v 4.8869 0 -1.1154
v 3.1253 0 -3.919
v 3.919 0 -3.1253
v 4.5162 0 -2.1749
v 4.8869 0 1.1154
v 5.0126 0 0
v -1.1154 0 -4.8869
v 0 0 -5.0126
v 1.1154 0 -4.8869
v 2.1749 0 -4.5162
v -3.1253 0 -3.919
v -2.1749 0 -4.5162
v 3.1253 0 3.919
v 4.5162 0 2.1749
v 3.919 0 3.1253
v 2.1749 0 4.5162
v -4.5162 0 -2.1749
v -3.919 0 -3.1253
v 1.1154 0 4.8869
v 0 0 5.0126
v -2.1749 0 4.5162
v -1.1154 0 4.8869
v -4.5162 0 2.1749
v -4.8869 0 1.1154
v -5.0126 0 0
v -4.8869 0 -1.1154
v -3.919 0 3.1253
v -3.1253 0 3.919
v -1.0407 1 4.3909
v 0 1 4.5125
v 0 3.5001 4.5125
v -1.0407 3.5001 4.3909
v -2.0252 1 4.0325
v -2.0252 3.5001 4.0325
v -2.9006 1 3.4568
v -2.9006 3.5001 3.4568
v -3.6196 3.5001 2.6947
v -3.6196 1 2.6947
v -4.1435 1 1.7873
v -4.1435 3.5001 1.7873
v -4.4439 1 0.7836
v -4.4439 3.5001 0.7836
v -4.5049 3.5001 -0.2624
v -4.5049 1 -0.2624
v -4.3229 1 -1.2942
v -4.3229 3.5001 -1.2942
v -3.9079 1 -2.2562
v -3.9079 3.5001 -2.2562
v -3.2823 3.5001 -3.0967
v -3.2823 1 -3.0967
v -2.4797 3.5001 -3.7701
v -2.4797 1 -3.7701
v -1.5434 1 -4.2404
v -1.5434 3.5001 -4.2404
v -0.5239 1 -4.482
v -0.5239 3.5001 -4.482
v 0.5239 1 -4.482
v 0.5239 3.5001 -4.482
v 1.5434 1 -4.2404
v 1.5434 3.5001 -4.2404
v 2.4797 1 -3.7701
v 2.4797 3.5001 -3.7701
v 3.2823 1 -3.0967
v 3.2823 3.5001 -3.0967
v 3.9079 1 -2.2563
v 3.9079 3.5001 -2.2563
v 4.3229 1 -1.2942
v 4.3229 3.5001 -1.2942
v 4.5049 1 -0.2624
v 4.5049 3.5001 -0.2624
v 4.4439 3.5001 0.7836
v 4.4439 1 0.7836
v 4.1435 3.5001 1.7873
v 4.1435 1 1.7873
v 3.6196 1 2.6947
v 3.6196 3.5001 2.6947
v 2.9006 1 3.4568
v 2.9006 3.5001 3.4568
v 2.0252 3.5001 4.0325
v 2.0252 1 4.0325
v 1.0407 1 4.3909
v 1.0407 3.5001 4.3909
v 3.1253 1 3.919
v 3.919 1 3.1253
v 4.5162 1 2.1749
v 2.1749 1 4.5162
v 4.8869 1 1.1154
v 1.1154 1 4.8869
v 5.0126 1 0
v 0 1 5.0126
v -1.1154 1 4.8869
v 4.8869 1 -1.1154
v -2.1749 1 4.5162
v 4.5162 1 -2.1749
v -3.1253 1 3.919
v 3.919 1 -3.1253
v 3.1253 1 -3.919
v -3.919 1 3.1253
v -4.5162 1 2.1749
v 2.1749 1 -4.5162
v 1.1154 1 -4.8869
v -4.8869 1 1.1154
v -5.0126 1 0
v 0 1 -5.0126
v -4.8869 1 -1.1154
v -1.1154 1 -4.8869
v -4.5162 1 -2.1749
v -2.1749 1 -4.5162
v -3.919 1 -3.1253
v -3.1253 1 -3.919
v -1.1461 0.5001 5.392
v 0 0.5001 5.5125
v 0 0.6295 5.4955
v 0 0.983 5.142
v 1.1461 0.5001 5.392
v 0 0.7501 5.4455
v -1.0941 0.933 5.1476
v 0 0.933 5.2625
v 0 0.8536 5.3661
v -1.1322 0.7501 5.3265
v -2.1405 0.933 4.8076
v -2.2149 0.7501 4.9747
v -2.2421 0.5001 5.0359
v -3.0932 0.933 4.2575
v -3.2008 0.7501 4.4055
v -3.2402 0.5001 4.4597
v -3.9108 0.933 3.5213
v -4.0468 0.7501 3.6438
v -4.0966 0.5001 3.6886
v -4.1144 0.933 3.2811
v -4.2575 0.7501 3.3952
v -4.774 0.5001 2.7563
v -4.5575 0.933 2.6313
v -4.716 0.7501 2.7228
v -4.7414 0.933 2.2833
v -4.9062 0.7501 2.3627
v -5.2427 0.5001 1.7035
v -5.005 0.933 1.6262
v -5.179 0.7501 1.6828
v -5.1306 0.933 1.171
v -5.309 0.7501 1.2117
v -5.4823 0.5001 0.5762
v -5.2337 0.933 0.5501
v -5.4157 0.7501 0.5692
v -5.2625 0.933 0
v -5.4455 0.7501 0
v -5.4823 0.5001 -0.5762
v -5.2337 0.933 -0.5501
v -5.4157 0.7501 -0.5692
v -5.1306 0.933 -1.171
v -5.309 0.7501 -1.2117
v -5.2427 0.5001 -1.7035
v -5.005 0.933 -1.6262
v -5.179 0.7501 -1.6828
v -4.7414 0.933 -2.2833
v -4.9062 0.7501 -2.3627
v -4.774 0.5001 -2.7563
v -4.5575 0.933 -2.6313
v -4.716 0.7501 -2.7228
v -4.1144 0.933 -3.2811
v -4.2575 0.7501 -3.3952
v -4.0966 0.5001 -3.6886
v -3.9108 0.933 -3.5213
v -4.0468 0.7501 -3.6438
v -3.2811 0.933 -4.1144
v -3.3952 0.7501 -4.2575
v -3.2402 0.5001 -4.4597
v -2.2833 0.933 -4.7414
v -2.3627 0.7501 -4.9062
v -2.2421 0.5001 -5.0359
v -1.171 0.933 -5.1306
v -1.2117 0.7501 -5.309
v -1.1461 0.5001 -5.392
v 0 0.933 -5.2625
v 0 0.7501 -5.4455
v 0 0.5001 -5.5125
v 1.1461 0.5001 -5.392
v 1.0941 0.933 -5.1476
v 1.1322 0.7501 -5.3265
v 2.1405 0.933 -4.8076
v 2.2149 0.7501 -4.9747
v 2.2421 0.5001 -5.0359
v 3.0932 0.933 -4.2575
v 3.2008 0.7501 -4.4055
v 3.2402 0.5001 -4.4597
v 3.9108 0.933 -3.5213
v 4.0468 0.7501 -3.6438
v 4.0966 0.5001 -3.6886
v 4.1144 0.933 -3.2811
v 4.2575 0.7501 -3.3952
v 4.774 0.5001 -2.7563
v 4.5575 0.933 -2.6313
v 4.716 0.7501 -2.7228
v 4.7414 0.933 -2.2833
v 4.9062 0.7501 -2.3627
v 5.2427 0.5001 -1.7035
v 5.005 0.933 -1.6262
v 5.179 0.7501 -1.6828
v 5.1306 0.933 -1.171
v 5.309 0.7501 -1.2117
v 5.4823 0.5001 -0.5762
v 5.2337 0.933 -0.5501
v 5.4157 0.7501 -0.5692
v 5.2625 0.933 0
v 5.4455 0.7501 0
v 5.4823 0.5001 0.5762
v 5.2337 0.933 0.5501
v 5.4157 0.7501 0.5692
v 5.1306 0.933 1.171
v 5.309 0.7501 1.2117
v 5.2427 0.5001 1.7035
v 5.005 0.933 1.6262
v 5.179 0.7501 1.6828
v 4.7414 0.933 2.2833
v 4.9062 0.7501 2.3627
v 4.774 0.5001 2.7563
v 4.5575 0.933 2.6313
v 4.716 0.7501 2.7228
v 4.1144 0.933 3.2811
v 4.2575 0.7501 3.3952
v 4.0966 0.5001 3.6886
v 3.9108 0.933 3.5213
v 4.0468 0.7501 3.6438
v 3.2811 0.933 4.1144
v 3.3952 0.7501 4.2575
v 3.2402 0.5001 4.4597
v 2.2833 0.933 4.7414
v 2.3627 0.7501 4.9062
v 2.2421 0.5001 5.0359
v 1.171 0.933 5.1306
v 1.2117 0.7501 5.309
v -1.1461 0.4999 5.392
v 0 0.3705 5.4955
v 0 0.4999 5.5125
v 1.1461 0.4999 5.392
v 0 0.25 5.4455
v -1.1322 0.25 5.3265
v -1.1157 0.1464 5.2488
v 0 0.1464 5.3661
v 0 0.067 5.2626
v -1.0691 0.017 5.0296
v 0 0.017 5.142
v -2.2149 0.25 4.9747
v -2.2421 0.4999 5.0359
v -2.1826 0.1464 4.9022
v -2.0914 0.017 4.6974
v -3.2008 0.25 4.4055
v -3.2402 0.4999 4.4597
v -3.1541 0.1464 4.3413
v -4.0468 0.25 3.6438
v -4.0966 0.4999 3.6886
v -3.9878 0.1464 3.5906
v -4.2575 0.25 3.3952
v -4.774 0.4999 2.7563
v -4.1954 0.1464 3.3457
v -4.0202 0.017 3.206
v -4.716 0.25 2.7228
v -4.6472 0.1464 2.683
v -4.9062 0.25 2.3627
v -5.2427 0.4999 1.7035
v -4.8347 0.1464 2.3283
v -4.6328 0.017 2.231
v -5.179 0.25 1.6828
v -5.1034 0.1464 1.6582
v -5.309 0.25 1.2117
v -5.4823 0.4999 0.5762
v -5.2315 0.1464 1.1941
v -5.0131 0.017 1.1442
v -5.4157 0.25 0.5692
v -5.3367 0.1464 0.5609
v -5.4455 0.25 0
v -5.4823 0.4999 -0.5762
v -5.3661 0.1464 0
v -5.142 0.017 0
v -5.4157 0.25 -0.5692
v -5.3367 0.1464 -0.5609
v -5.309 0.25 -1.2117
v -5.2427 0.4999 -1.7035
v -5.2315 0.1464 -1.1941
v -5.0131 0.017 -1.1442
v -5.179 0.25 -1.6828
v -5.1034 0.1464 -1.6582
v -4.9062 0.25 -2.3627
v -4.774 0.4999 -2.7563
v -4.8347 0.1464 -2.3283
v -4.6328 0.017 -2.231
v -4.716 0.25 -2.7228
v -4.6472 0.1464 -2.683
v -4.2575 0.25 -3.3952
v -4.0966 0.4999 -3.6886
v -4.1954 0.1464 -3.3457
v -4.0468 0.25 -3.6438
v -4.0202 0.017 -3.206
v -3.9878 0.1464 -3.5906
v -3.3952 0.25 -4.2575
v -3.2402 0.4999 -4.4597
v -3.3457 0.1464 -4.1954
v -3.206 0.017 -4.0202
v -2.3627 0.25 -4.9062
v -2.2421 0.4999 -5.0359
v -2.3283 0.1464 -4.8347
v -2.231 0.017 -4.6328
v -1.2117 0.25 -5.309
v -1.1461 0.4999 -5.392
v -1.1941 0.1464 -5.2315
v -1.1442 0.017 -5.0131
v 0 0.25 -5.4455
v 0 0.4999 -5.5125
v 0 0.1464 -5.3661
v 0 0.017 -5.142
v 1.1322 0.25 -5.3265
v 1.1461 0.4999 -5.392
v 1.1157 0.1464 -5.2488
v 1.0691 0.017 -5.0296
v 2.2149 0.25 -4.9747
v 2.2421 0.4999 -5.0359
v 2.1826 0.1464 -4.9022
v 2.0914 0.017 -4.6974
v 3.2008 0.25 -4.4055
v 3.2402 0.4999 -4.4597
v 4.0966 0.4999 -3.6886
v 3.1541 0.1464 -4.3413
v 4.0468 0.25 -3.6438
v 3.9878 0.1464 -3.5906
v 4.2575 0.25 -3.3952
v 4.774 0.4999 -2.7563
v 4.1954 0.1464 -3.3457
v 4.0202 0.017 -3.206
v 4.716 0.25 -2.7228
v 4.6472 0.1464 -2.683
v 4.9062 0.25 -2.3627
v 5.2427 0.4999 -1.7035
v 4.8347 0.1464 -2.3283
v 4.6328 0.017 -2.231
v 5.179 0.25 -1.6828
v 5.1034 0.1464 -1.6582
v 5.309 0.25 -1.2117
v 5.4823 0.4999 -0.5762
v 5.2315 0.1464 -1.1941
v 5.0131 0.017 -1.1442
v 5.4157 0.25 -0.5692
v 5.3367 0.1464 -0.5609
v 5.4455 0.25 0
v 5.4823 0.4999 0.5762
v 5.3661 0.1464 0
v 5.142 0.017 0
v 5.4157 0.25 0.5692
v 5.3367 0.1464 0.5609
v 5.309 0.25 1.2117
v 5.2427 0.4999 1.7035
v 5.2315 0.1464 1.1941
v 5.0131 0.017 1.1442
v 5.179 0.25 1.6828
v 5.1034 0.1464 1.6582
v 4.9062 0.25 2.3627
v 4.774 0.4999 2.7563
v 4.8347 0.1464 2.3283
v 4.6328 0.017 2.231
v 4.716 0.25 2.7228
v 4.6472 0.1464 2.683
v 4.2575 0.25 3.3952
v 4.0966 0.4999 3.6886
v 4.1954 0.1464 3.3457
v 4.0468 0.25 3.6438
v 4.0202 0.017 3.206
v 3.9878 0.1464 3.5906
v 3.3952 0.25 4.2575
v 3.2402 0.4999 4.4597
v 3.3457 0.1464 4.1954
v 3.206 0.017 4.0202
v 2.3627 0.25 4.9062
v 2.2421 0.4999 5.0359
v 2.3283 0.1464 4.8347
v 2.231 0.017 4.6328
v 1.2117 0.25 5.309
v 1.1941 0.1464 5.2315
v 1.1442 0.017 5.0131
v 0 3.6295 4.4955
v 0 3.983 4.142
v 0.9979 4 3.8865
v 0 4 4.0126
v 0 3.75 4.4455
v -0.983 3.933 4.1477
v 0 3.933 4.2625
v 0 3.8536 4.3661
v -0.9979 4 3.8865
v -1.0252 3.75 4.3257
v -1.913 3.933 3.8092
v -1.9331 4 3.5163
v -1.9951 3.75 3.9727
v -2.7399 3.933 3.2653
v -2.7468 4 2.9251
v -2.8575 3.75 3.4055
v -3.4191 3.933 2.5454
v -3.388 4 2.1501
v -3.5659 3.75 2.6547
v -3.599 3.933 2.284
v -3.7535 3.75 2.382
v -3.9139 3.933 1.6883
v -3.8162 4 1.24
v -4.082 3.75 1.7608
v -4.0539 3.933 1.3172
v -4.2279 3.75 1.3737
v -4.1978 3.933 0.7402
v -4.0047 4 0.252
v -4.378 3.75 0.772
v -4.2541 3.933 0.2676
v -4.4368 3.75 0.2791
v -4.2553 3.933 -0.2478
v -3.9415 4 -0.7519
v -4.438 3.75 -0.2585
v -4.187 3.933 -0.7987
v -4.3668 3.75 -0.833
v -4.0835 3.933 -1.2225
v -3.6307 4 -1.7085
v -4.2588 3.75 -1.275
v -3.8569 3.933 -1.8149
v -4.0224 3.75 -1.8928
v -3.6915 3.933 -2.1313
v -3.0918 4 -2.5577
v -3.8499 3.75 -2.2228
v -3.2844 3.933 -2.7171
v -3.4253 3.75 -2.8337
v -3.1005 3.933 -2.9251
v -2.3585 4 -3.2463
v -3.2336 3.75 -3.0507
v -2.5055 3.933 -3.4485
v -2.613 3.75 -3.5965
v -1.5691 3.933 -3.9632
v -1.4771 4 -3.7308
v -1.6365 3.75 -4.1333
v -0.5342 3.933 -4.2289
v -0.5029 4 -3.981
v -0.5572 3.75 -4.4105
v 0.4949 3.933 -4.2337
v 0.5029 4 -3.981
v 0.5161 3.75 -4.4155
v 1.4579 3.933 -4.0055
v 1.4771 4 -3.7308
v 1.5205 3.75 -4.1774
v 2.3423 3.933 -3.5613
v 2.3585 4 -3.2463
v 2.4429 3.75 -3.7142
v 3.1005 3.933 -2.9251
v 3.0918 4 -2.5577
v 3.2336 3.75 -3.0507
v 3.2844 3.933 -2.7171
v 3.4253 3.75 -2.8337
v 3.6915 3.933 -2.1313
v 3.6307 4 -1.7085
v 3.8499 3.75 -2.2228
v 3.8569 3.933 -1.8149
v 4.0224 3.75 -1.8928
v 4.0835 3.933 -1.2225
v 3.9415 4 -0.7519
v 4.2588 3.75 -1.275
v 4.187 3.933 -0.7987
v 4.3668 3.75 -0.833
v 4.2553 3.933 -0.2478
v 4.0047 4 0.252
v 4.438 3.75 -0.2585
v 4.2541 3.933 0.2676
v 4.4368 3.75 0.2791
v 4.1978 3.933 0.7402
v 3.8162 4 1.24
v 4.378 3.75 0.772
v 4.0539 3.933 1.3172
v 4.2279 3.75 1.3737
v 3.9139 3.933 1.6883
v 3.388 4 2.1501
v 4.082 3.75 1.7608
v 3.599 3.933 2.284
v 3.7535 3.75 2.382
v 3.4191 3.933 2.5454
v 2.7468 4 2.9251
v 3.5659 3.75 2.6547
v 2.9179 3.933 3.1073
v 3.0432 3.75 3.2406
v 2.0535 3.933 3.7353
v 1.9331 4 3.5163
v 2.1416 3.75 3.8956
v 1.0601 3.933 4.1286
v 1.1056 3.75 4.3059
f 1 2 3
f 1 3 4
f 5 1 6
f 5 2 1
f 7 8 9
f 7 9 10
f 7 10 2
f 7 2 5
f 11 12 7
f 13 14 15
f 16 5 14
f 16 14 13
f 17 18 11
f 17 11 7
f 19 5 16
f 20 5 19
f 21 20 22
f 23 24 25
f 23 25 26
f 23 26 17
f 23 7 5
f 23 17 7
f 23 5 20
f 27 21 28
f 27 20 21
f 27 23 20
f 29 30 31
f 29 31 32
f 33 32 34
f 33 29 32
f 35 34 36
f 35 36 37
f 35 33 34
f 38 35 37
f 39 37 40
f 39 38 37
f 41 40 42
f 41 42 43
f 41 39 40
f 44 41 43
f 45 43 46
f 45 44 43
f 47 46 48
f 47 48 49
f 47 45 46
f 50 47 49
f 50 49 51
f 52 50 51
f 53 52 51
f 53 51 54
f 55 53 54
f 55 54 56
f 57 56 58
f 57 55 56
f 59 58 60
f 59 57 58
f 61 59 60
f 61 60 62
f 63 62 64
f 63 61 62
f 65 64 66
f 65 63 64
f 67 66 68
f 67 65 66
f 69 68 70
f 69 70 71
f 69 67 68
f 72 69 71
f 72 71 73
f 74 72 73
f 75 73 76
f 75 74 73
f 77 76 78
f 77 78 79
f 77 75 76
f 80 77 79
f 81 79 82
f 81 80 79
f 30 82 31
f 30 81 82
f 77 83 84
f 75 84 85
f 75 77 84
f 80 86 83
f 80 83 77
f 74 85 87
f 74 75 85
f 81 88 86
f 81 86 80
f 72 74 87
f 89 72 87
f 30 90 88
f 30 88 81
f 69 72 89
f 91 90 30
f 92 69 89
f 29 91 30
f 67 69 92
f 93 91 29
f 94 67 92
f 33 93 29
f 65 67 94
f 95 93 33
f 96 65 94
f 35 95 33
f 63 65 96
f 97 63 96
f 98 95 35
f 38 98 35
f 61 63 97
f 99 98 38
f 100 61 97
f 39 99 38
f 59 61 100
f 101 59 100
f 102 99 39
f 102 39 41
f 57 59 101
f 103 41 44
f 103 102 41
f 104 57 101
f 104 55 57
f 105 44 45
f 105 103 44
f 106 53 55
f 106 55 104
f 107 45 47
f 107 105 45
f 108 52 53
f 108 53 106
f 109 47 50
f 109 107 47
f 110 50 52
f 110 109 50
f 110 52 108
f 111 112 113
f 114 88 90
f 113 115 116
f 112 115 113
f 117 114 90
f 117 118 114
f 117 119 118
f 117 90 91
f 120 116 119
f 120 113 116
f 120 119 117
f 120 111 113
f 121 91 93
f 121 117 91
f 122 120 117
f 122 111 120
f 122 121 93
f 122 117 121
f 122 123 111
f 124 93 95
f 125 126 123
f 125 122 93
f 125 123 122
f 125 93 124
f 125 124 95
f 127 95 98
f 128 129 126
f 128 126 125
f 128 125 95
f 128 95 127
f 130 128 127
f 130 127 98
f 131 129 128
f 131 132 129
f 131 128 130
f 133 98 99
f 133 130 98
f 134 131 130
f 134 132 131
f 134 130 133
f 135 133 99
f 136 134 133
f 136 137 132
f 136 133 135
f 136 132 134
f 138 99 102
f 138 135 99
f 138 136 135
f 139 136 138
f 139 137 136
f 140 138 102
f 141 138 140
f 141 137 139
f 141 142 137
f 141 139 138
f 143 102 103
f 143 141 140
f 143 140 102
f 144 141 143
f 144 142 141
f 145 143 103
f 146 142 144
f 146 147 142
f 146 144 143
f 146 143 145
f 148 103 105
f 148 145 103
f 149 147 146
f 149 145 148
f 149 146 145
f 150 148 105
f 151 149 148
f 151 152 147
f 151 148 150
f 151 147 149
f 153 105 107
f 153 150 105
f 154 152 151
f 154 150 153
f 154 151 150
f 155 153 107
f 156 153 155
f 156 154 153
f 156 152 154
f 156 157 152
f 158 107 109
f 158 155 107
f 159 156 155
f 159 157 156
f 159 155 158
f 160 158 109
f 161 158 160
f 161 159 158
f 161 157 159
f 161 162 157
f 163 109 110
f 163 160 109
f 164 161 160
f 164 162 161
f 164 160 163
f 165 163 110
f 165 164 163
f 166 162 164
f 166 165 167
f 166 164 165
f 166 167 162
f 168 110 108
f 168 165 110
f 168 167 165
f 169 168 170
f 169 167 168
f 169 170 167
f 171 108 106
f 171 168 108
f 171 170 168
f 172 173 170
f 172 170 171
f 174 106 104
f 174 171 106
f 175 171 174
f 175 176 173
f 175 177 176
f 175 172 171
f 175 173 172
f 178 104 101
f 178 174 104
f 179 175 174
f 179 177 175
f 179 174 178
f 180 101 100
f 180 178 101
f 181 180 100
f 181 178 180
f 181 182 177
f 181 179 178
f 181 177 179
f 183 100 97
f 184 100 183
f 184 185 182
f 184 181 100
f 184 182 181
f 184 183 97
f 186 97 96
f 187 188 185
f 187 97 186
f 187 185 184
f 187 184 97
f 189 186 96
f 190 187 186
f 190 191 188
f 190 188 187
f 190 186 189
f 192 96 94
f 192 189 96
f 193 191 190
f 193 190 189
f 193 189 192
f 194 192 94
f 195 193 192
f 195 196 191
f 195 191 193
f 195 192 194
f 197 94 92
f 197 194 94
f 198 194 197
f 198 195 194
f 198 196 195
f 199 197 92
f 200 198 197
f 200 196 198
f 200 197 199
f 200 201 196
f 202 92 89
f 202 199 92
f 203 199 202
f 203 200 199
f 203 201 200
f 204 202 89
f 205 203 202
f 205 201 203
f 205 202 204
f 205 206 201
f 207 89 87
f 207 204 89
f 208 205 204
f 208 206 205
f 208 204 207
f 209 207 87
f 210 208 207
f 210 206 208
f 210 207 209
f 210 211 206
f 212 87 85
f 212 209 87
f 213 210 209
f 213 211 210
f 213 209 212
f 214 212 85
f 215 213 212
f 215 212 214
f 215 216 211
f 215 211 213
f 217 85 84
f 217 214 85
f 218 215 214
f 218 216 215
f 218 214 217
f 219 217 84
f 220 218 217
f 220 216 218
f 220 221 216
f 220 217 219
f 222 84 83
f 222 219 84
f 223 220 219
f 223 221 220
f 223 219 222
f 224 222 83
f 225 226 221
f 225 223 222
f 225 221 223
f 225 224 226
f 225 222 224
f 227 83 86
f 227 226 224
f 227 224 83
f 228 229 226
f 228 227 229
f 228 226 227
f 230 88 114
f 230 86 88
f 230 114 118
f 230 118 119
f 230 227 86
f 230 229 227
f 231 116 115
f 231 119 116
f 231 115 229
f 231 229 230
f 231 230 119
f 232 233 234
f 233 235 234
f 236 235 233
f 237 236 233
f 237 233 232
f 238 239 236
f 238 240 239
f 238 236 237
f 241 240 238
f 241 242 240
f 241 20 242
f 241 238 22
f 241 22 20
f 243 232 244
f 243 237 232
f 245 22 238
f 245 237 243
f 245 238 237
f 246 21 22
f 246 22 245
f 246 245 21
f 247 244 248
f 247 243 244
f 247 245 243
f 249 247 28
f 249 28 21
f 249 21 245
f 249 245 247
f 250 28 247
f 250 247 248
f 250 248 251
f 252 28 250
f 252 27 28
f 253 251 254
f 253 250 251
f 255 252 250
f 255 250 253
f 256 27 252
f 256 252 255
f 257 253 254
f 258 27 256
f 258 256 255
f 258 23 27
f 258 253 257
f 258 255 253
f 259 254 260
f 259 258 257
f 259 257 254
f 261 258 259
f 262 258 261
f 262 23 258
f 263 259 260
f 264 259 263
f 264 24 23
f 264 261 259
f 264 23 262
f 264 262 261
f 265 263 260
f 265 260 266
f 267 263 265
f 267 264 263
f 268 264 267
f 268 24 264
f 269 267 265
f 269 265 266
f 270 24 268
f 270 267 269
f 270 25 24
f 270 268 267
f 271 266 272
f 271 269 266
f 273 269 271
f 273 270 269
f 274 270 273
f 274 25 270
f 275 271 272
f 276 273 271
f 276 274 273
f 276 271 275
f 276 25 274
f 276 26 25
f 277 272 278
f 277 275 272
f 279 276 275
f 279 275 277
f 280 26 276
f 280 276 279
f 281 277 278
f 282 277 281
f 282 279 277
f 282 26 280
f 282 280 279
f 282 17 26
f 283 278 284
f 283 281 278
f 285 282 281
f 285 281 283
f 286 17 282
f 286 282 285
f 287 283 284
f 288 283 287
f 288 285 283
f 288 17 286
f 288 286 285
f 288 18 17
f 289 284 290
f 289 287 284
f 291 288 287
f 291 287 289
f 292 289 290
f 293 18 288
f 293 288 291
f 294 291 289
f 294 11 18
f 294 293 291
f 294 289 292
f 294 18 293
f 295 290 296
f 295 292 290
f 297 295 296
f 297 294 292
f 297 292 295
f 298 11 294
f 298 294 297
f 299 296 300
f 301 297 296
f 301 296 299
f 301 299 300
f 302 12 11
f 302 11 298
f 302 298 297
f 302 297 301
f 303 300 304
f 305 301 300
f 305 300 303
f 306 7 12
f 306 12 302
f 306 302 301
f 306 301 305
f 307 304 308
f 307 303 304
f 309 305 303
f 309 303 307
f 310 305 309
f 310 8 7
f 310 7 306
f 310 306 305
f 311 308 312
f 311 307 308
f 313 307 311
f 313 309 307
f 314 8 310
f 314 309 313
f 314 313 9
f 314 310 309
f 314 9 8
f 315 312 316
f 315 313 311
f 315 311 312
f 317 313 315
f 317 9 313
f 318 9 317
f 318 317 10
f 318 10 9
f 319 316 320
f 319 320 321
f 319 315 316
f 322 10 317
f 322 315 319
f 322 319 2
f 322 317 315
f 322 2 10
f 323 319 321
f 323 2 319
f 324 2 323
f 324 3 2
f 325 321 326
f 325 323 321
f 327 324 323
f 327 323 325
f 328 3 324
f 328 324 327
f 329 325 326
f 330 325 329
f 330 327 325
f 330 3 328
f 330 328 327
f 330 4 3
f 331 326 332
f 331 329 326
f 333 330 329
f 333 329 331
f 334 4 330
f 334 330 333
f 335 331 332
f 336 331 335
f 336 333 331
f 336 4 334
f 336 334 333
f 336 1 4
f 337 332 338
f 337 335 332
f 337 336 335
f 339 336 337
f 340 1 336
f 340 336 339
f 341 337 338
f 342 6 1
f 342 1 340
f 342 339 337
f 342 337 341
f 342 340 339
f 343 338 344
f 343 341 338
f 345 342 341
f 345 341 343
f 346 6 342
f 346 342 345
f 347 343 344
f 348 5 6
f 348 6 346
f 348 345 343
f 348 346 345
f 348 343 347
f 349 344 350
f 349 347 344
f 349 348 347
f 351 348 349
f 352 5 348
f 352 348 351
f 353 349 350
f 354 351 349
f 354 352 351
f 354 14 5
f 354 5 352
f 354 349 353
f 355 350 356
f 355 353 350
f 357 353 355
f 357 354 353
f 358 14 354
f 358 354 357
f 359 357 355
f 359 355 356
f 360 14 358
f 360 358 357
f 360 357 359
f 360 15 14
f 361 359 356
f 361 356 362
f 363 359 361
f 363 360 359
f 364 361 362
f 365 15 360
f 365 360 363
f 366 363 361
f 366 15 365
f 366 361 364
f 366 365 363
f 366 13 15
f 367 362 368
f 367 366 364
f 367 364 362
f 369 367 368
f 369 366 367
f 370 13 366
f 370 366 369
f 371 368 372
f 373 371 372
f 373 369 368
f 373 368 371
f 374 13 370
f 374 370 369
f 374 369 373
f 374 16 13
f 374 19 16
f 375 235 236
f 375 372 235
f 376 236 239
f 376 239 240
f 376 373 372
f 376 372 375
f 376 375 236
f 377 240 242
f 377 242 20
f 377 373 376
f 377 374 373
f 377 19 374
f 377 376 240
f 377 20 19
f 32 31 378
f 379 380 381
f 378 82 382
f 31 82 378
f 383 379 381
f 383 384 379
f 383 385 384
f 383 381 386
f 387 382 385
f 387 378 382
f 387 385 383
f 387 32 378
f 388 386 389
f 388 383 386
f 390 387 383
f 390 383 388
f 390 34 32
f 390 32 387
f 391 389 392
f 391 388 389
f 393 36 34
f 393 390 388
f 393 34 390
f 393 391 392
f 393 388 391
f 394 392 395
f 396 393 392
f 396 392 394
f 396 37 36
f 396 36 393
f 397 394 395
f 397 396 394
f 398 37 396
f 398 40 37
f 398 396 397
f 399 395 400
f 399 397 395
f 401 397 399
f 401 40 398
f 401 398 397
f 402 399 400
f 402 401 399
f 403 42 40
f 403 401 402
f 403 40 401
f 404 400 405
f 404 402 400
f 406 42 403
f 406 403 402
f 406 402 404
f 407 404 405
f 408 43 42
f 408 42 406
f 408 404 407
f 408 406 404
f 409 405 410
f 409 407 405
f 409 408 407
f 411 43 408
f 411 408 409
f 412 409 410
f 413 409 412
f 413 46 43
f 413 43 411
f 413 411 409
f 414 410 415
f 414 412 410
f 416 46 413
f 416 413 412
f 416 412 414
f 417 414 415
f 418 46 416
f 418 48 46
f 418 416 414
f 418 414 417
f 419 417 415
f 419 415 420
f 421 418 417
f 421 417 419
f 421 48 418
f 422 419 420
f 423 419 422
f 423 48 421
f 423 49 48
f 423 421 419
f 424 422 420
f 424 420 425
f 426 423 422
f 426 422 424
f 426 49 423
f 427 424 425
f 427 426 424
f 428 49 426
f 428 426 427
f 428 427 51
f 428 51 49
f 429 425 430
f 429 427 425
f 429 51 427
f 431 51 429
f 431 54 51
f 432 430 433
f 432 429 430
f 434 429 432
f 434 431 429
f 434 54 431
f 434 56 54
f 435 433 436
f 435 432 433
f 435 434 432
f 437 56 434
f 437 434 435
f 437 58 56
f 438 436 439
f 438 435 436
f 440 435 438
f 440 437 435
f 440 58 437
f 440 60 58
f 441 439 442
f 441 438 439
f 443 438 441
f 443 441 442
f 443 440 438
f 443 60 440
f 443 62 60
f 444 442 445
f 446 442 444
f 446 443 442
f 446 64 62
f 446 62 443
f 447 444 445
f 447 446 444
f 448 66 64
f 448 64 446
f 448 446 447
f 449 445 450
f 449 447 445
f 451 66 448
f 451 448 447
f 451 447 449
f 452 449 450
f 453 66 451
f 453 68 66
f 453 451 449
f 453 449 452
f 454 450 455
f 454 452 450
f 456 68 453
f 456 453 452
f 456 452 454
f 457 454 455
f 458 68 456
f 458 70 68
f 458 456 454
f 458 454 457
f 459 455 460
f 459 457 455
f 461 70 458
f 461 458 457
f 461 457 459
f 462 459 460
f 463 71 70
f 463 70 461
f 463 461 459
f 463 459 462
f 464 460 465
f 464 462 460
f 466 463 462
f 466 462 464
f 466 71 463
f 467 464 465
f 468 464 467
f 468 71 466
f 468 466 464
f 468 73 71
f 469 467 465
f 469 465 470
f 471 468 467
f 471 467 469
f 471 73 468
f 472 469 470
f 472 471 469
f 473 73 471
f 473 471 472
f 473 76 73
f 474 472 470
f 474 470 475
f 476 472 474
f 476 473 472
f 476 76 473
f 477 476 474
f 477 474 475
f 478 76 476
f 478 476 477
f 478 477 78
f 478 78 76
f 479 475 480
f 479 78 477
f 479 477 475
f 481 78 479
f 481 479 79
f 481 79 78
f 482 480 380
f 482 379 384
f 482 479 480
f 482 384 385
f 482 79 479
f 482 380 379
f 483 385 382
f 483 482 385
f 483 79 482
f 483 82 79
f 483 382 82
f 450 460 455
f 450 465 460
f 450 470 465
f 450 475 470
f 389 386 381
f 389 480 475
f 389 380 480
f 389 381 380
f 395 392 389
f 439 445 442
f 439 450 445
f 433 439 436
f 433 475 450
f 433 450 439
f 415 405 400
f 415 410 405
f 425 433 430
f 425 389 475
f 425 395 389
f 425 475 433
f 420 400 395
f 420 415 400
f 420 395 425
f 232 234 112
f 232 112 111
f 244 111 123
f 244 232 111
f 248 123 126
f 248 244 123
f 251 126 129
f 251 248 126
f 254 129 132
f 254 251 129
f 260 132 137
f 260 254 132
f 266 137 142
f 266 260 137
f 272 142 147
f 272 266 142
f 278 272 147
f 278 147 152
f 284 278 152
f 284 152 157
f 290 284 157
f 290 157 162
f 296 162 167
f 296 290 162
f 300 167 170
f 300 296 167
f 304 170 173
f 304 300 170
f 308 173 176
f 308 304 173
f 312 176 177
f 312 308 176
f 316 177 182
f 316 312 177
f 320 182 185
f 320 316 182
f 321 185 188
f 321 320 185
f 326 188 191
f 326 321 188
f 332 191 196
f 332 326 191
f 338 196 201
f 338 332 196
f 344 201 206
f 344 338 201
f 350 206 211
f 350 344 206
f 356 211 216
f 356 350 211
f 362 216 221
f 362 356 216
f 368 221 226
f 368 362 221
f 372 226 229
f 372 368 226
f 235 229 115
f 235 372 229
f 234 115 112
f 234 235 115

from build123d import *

# Parameters (mm, degrees)
FILLET1_R = 0.5


with BuildPart() as part:
    # Sketch1 → Revolve1 (revolve)
    with BuildSketch(Plane(origin=(0, 0, 0), x_dir=(0, 0, -1), z_dir=(1, 0, 0))):
        Polygon((0, 0), (0, 4), (-4.5125, 4), (-4.5125, 1), (-5.5125, 1), (-5.5125, 0), align=None)
    revolve(axis=Axis((0, 0, 0), (0, -1, 0)))

    # Fillet1
    fillet1_edges = [part.edges().sort_by_distance(p)[0] for p in [
        (0, 0, -5.5125),
        (0, 1, -5.5125),
        (0, 4, -4.5125),
    ]]
    fillet(fillet1_edges, radius=FILLET1_R - 0.0001)  # a hair under: the kernel refuses the full size


solid = part.part
